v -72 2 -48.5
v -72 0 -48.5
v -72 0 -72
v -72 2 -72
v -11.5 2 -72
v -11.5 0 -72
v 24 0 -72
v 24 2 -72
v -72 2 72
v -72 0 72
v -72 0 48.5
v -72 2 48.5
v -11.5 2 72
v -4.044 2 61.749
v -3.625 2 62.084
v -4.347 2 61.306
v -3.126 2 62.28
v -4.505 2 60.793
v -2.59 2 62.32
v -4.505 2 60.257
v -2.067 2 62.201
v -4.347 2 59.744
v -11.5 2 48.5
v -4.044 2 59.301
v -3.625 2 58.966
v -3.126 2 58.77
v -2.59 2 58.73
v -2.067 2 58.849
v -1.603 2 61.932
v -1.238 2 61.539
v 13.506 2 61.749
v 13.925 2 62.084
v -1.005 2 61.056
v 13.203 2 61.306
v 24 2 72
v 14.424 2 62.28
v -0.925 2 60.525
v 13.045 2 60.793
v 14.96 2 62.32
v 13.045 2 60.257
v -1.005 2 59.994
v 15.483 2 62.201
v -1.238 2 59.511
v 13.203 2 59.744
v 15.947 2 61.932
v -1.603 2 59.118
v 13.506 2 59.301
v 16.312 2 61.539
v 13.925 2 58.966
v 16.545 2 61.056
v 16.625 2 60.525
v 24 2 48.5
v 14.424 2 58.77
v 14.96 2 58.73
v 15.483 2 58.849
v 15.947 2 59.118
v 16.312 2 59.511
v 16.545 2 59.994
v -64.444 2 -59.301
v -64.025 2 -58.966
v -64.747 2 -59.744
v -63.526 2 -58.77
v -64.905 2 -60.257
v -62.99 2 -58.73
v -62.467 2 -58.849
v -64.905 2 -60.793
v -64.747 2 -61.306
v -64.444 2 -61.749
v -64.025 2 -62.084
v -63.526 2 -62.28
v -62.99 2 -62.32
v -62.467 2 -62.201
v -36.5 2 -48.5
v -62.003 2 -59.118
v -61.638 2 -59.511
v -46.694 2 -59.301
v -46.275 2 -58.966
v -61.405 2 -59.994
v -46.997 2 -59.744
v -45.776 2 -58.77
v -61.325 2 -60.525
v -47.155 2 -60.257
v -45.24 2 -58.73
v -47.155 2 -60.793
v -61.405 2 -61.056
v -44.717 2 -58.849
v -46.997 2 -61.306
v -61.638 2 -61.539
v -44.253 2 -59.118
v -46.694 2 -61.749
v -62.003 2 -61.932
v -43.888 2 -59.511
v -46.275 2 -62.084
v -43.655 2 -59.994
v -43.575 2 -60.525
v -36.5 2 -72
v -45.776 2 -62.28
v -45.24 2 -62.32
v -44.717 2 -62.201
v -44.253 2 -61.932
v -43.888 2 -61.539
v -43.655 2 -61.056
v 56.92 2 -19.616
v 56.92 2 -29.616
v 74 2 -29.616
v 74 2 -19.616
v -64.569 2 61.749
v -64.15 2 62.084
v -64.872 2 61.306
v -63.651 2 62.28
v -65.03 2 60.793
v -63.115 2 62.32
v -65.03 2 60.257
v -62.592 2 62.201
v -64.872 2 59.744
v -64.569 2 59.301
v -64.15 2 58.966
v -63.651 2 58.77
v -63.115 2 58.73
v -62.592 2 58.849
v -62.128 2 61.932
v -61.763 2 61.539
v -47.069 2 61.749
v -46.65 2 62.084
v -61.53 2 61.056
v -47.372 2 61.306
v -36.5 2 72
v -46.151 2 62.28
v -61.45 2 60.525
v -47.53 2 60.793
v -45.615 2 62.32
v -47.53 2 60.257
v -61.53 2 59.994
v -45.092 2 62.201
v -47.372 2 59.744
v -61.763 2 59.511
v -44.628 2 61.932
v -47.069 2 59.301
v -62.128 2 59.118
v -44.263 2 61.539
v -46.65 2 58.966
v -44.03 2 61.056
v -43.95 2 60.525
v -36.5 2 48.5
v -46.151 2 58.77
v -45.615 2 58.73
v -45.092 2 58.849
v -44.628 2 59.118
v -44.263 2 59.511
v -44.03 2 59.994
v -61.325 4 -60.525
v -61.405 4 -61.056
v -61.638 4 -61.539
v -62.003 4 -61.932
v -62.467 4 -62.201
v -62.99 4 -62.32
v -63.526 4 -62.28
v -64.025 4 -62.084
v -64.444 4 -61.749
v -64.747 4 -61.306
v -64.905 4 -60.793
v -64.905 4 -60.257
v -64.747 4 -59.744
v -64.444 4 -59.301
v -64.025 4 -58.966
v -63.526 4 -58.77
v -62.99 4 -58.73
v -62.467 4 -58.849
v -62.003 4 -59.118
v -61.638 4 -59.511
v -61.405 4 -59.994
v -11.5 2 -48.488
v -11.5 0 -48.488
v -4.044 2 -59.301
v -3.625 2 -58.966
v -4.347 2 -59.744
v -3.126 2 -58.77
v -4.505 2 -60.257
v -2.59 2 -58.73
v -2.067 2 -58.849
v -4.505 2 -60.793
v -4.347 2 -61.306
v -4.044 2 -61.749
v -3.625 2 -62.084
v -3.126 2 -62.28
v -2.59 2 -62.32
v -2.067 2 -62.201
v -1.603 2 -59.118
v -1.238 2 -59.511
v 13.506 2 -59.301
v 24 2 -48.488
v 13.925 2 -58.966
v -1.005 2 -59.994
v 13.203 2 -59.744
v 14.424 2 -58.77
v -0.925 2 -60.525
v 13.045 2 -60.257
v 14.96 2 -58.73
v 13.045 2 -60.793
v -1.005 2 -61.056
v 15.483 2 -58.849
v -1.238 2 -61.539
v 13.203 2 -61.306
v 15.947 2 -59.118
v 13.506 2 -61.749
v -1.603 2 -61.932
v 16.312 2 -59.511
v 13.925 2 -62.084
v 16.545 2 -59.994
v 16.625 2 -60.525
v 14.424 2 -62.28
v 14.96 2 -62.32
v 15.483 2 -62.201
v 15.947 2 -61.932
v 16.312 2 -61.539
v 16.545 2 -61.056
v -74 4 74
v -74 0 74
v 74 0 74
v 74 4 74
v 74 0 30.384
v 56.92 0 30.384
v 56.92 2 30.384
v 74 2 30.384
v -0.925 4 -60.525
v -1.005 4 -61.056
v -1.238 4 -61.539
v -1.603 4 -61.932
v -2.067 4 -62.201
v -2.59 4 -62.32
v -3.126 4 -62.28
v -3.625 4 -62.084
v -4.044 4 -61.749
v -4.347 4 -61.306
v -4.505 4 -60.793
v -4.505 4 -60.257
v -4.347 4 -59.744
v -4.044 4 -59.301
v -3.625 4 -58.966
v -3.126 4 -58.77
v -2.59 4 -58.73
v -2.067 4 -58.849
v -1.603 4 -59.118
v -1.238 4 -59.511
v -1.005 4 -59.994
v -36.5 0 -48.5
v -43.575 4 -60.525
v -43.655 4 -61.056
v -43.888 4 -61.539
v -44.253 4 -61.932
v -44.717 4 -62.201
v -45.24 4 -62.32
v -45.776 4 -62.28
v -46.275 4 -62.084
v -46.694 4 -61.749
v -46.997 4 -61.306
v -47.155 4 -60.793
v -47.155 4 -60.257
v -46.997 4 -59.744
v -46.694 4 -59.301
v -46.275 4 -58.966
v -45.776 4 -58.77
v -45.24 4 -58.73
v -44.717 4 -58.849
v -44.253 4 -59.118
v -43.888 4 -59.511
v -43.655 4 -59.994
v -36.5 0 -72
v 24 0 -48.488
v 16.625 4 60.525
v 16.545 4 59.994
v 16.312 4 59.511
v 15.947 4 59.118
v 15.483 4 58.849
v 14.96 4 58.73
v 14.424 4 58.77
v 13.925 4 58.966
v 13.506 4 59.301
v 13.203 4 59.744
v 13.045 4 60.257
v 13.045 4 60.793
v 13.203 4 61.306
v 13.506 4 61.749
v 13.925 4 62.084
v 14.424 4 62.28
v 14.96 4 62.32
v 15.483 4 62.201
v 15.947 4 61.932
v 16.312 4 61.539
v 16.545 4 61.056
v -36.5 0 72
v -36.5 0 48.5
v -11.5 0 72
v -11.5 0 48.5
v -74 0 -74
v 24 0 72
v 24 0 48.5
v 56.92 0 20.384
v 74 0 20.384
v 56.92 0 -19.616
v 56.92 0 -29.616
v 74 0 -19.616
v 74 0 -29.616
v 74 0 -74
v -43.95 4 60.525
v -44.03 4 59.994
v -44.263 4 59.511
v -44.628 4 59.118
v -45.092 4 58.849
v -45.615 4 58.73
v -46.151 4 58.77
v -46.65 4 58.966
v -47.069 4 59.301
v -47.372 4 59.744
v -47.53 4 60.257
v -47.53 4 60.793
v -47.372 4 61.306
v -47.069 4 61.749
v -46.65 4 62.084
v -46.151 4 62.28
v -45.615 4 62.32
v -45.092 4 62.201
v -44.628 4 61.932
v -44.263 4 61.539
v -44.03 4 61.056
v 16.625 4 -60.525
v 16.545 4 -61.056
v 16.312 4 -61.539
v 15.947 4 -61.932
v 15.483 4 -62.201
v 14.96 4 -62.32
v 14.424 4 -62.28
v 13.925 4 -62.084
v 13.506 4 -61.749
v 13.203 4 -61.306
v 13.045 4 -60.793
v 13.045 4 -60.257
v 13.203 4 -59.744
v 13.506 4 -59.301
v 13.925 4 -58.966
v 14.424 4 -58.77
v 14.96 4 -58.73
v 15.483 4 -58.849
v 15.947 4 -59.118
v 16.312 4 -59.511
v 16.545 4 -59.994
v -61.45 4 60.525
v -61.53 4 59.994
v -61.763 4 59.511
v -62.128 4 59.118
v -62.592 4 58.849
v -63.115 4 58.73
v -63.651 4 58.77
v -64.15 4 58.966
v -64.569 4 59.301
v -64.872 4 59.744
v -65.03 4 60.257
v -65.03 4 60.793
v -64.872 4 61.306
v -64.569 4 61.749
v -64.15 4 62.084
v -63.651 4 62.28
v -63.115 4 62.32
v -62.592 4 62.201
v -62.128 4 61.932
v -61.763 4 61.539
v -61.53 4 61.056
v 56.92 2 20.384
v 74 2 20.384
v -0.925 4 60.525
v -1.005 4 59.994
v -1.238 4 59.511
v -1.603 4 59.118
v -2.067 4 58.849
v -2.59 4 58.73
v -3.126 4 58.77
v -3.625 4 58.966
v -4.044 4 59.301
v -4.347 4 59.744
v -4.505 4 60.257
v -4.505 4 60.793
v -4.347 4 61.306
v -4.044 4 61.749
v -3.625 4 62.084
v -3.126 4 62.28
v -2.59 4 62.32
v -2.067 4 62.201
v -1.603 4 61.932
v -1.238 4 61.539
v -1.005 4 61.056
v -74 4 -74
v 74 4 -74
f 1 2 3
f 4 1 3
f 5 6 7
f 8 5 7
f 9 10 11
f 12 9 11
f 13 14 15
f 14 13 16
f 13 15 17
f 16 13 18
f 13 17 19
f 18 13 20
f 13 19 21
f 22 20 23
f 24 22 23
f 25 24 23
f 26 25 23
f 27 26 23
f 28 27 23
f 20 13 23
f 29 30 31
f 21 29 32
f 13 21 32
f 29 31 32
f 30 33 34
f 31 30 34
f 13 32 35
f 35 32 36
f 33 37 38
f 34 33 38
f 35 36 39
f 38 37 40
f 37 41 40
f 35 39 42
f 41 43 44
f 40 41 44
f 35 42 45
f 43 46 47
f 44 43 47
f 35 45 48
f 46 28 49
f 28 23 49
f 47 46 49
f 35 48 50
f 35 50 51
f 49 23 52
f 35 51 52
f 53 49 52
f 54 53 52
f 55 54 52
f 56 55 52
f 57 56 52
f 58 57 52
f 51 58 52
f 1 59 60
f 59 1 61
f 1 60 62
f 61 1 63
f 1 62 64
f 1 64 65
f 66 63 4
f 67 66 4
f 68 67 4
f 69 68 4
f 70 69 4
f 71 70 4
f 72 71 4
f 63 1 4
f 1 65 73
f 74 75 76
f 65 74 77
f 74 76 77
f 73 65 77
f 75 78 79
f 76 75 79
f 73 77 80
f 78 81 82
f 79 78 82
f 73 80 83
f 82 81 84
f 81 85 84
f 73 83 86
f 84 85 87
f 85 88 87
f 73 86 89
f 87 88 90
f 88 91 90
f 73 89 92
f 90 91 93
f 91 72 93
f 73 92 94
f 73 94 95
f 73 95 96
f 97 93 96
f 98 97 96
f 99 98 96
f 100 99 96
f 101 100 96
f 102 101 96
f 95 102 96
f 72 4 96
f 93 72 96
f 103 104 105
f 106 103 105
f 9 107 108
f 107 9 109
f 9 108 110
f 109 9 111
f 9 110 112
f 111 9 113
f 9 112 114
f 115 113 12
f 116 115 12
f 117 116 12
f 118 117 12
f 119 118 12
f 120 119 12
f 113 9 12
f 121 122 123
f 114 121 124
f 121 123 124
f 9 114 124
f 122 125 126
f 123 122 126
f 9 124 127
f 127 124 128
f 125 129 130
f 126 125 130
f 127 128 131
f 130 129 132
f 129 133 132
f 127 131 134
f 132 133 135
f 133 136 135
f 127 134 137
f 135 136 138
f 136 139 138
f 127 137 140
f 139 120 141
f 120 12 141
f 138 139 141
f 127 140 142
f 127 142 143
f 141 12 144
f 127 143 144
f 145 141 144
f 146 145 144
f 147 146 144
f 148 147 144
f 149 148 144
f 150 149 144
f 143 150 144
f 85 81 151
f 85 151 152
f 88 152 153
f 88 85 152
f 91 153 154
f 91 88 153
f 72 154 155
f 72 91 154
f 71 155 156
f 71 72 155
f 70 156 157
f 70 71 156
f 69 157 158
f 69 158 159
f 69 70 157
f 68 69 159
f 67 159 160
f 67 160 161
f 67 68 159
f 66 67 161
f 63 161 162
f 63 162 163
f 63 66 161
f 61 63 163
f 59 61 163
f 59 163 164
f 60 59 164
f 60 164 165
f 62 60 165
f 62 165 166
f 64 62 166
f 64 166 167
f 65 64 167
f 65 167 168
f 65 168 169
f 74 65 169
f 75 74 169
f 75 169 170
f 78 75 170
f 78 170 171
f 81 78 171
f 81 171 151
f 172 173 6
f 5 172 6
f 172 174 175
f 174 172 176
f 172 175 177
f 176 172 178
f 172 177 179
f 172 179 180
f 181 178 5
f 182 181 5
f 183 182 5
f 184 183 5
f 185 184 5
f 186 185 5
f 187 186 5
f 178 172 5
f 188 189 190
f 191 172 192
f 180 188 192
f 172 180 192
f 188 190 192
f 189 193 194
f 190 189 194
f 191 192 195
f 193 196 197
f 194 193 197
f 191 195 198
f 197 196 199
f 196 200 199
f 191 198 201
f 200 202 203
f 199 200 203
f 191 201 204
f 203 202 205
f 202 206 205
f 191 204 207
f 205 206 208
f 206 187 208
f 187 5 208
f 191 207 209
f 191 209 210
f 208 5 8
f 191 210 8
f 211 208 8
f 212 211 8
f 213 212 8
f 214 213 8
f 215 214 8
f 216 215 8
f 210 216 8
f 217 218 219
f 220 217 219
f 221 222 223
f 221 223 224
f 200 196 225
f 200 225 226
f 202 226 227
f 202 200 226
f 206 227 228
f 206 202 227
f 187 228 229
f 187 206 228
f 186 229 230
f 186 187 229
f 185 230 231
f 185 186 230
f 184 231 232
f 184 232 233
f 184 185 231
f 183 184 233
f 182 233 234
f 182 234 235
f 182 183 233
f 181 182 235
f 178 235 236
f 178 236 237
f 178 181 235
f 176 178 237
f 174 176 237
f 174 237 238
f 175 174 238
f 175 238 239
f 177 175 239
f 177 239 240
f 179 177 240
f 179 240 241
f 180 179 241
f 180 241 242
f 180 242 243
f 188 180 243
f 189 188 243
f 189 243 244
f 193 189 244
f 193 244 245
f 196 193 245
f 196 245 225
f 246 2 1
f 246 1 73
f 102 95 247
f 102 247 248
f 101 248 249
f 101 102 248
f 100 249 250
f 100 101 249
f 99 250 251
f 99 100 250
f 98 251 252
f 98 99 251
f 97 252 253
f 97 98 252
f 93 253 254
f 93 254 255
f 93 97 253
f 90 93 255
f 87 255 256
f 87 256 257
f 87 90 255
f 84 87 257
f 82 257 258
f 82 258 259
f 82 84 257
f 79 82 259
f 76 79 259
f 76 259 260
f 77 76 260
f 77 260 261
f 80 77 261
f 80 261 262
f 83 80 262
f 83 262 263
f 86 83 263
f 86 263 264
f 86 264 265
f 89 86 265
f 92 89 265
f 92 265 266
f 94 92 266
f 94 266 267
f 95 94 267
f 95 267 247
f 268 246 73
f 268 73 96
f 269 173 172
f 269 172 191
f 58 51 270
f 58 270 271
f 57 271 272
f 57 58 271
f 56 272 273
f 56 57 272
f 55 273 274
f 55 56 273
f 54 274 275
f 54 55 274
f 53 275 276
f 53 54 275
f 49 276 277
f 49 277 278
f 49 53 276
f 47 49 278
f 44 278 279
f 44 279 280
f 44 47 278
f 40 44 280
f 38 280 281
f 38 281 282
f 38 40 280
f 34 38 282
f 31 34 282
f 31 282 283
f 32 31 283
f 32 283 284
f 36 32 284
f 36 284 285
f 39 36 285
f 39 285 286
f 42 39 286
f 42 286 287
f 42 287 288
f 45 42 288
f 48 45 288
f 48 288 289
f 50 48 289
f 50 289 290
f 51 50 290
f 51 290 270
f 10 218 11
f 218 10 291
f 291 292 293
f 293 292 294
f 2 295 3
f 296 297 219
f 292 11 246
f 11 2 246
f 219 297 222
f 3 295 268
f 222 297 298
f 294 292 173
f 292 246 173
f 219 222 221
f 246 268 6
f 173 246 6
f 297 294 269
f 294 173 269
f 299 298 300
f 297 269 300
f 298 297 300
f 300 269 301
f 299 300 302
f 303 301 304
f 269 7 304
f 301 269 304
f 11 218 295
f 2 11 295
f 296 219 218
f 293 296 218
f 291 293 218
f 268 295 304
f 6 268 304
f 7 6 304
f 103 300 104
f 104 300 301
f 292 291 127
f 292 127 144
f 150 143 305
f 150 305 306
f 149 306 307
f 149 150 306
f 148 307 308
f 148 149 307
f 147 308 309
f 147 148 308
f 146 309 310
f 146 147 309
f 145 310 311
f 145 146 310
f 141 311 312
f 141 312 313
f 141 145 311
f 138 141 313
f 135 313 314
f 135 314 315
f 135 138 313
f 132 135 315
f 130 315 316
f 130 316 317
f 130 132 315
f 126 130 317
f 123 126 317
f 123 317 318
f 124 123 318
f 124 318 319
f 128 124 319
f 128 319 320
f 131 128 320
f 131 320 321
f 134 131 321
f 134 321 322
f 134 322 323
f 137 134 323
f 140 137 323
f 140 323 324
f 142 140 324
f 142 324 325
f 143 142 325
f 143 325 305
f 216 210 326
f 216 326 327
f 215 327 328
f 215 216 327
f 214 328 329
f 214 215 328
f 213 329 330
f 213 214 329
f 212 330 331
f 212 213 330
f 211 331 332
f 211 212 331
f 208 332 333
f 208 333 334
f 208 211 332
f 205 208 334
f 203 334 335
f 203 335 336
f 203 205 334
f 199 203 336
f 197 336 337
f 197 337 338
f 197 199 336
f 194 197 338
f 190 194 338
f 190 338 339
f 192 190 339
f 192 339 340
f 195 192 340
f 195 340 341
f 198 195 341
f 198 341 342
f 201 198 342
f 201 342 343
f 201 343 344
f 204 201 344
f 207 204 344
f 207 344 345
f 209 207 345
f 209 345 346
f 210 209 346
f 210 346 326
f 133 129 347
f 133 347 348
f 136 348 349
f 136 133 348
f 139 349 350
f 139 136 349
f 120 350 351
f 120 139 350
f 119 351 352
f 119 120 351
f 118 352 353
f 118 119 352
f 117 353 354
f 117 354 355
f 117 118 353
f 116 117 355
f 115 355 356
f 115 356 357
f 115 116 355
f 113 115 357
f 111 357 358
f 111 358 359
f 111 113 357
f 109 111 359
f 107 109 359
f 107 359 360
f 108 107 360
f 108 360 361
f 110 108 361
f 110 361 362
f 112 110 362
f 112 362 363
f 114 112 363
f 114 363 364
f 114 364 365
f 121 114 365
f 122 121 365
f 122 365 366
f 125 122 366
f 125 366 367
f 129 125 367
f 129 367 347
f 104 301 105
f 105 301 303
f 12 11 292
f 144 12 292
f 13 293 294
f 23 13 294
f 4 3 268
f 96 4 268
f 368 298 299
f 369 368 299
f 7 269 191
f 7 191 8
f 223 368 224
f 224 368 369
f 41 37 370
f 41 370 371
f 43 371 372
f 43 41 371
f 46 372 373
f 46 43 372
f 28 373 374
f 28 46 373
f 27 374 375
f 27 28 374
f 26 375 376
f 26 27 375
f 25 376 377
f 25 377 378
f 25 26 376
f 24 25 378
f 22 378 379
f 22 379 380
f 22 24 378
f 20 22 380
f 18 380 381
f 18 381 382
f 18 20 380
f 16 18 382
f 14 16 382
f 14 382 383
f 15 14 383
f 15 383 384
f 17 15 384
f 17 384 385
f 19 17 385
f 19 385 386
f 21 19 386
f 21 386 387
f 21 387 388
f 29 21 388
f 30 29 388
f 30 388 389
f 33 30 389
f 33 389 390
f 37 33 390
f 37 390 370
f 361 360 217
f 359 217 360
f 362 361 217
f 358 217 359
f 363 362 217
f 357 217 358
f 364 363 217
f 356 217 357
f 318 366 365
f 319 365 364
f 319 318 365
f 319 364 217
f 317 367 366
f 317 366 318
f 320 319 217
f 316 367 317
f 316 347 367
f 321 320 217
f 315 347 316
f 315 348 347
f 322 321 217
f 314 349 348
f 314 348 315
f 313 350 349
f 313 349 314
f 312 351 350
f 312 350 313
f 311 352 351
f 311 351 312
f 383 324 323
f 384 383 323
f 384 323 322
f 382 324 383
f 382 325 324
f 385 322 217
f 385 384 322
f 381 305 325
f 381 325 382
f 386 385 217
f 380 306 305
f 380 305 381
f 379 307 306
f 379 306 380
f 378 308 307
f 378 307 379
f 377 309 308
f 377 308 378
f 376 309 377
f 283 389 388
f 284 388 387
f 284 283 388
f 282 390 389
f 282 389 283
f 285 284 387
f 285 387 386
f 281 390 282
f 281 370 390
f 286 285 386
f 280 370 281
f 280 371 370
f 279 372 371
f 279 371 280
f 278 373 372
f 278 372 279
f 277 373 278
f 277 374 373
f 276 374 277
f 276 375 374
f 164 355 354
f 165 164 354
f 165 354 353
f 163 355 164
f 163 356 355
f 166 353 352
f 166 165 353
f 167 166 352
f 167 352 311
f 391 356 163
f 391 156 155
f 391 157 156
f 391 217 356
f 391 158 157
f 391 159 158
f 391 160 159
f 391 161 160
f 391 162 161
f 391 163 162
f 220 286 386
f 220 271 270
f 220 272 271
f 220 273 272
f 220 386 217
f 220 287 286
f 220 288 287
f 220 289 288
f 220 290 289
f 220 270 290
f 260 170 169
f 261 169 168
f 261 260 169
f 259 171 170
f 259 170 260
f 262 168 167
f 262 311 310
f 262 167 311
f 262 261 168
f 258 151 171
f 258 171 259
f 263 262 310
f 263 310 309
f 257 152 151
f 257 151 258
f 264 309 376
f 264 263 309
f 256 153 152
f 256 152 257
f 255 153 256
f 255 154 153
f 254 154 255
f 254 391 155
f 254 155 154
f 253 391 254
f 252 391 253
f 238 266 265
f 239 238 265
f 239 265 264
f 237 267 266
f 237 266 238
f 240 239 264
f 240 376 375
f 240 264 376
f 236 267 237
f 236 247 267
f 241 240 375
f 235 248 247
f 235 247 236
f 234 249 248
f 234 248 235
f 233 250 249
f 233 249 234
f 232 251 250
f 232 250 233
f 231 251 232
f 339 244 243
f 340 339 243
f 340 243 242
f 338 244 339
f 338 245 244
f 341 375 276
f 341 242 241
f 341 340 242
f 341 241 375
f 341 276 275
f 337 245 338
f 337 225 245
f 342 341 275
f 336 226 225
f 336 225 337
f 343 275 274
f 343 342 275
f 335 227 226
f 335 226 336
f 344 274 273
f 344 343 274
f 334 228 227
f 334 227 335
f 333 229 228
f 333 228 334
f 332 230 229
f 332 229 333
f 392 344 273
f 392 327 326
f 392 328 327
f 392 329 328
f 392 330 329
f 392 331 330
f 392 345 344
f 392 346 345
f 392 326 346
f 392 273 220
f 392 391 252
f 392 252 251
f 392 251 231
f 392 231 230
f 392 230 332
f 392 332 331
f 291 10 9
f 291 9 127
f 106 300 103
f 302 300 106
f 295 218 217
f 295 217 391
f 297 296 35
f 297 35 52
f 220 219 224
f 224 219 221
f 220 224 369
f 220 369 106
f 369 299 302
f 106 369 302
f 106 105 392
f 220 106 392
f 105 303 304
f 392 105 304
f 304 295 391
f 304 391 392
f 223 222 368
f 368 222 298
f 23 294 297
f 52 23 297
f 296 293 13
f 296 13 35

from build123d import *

# Parameters (mm, degrees)
ESQUISSE1_W              = 148
ESQUISSE1_H              = 148
BOSS_EXTRU_1_DEPTH       = 4
ESQUISSE4_R              = 1.8
ENL_V_MAT_EXTRU_2_DEPTH  = 4
ESQUISSE5_W              = 35.5
ESQUISSE5_H              = 23.5
ENL_V_MAT_EXTRU_3_DEPTH  = 2
ESQUISSE8_R              = 1.8
ENL_V_MAT_EXTRU_6_DEPTH  = 4
ESQUISSE9_W              = 35.5
ESQUISSE9_H              = 23.5
ENL_V_MAT_EXTRU_7_DEPTH  = 2
ESQUISSE10_R             = 1.8
ENL_V_MAT_EXTRU_8_DEPTH  = 4
ESQUISSE11_W             = 35.5
ESQUISSE11_H             = 23.5
ESQUISSE11_H_2           = 23.512269398
ENL_V_MAT_EXTRU_9_DEPTH  = 2
ESQUISSE12_W             = 23.640980831
ESQUISSE12_H             = 10
ESQUISSE12_W_2           = 17.131931469
ENL_V_MAT_EXTRU_12_DEPTH = 2


with BuildPart() as part:
    # Esquisse1 → Boss.-Extru.1 (new body)
    with BuildSketch(Plane(origin=(0, 0, 0), x_dir=(1, 0, 0), z_dir=(0, 1, 0))):
        Rectangle(ESQUISSE1_W, ESQUISSE1_H)
    extrude(amount=BOSS_EXTRU_1_DEPTH)

    # Esquisse4 → Enlèv. mat.-Extru.2 (cut)
    with BuildSketch(Plane(origin=(0, 0, 0), x_dir=(1, 0, 0), z_dir=(0, 1, 0))):
        with Locations((-63.25, -60.525)):
            Circle(ESQUISSE4_R)
        with Locations((-45.75, -60.525)):
            Circle(ESQUISSE4_R)
    extrude(amount=ENL_V_MAT_EXTRU_2_DEPTH, mode=Mode.SUBTRACT)

    # Esquisse5 → Enlèv. mat.-Extru.3 (cut)
    with BuildSketch(Plane(origin=(0, 0, 0), x_dir=(1, 0, 0), z_dir=(0, 1, 0))):
        with Locations((-54.25, -60.25)):
            Rectangle(ESQUISSE5_W, ESQUISSE5_H)
    extrude(amount=ENL_V_MAT_EXTRU_3_DEPTH, mode=Mode.SUBTRACT)

    # Esquisse8 → Enlèv. mat.-Extru.6 (cut)
    with BuildSketch(Plane(origin=(0, 0, 0), x_dir=(1, 0, 0), z_dir=(0, 1, 0))):
        with Locations((-2.725, -60.525)):
            Circle(ESQUISSE8_R)
        with Locations((14.825, -60.525)):
            Circle(ESQUISSE8_R)
    extrude(amount=ENL_V_MAT_EXTRU_6_DEPTH, mode=Mode.SUBTRACT)

    # Esquisse9 → Enlèv. mat.-Extru.7 (cut)
    with BuildSketch(Plane(origin=(0, 0, 0), x_dir=(1, 0, 0), z_dir=(0, 1, 0))):
        with Locations((6.25, -60.25)):
            Rectangle(ESQUISSE9_W, ESQUISSE9_H)
    extrude(amount=ENL_V_MAT_EXTRU_7_DEPTH, mode=Mode.SUBTRACT)

    # Esquisse10 → Enlèv. mat.-Extru.8 (cut)
    with BuildSketch(Plane(origin=(0, 0, 0), x_dir=(1, 0, 0), z_dir=(0, 1, 0))):
        with Locations((-2.725, 60.525)):
            Circle(ESQUISSE10_R)
        with Locations((14.825, 60.525)):
            Circle(ESQUISSE10_R)
        with Locations((-63.125, 60.525)):
            Circle(ESQUISSE10_R)
        with Locations((-45.375, 60.525)):
            Circle(ESQUISSE10_R)
    extrude(amount=ENL_V_MAT_EXTRU_8_DEPTH, mode=Mode.SUBTRACT)

    # Esquisse11 → Enlèv. mat.-Extru.9 (cut)
    with BuildSketch(Plane(origin=(0, 0, 0), x_dir=(1, 0, 0), z_dir=(0, 1, 0))):
        with Locations((-54.25, 60.25)):
            Rectangle(ESQUISSE11_W, ESQUISSE11_H)
        with Locations((6.25, 60.243865301)):
            Rectangle(ESQUISSE11_W, ESQUISSE11_H_2)
    extrude(amount=ENL_V_MAT_EXTRU_9_DEPTH, mode=Mode.SUBTRACT)

    # Esquisse12 → Enlèv. mat.-Extru.12 (cut)
    with BuildSketch(Plane(origin=(0, 0, 0), x_dir=(1, 0, 0), z_dir=(0, 1, 0))):
        with Locations((68.740682109, -25.384218458)):
            Rectangle(ESQUISSE12_W, ESQUISSE12_H)
        with Locations((65.486157429, 24.615781542)):
            Rectangle(ESQUISSE12_W_2, ESQUISSE12_H)
    extrude(amount=ENL_V_MAT_EXTRU_12_DEPTH, mode=Mode.SUBTRACT)


solid = part.part
